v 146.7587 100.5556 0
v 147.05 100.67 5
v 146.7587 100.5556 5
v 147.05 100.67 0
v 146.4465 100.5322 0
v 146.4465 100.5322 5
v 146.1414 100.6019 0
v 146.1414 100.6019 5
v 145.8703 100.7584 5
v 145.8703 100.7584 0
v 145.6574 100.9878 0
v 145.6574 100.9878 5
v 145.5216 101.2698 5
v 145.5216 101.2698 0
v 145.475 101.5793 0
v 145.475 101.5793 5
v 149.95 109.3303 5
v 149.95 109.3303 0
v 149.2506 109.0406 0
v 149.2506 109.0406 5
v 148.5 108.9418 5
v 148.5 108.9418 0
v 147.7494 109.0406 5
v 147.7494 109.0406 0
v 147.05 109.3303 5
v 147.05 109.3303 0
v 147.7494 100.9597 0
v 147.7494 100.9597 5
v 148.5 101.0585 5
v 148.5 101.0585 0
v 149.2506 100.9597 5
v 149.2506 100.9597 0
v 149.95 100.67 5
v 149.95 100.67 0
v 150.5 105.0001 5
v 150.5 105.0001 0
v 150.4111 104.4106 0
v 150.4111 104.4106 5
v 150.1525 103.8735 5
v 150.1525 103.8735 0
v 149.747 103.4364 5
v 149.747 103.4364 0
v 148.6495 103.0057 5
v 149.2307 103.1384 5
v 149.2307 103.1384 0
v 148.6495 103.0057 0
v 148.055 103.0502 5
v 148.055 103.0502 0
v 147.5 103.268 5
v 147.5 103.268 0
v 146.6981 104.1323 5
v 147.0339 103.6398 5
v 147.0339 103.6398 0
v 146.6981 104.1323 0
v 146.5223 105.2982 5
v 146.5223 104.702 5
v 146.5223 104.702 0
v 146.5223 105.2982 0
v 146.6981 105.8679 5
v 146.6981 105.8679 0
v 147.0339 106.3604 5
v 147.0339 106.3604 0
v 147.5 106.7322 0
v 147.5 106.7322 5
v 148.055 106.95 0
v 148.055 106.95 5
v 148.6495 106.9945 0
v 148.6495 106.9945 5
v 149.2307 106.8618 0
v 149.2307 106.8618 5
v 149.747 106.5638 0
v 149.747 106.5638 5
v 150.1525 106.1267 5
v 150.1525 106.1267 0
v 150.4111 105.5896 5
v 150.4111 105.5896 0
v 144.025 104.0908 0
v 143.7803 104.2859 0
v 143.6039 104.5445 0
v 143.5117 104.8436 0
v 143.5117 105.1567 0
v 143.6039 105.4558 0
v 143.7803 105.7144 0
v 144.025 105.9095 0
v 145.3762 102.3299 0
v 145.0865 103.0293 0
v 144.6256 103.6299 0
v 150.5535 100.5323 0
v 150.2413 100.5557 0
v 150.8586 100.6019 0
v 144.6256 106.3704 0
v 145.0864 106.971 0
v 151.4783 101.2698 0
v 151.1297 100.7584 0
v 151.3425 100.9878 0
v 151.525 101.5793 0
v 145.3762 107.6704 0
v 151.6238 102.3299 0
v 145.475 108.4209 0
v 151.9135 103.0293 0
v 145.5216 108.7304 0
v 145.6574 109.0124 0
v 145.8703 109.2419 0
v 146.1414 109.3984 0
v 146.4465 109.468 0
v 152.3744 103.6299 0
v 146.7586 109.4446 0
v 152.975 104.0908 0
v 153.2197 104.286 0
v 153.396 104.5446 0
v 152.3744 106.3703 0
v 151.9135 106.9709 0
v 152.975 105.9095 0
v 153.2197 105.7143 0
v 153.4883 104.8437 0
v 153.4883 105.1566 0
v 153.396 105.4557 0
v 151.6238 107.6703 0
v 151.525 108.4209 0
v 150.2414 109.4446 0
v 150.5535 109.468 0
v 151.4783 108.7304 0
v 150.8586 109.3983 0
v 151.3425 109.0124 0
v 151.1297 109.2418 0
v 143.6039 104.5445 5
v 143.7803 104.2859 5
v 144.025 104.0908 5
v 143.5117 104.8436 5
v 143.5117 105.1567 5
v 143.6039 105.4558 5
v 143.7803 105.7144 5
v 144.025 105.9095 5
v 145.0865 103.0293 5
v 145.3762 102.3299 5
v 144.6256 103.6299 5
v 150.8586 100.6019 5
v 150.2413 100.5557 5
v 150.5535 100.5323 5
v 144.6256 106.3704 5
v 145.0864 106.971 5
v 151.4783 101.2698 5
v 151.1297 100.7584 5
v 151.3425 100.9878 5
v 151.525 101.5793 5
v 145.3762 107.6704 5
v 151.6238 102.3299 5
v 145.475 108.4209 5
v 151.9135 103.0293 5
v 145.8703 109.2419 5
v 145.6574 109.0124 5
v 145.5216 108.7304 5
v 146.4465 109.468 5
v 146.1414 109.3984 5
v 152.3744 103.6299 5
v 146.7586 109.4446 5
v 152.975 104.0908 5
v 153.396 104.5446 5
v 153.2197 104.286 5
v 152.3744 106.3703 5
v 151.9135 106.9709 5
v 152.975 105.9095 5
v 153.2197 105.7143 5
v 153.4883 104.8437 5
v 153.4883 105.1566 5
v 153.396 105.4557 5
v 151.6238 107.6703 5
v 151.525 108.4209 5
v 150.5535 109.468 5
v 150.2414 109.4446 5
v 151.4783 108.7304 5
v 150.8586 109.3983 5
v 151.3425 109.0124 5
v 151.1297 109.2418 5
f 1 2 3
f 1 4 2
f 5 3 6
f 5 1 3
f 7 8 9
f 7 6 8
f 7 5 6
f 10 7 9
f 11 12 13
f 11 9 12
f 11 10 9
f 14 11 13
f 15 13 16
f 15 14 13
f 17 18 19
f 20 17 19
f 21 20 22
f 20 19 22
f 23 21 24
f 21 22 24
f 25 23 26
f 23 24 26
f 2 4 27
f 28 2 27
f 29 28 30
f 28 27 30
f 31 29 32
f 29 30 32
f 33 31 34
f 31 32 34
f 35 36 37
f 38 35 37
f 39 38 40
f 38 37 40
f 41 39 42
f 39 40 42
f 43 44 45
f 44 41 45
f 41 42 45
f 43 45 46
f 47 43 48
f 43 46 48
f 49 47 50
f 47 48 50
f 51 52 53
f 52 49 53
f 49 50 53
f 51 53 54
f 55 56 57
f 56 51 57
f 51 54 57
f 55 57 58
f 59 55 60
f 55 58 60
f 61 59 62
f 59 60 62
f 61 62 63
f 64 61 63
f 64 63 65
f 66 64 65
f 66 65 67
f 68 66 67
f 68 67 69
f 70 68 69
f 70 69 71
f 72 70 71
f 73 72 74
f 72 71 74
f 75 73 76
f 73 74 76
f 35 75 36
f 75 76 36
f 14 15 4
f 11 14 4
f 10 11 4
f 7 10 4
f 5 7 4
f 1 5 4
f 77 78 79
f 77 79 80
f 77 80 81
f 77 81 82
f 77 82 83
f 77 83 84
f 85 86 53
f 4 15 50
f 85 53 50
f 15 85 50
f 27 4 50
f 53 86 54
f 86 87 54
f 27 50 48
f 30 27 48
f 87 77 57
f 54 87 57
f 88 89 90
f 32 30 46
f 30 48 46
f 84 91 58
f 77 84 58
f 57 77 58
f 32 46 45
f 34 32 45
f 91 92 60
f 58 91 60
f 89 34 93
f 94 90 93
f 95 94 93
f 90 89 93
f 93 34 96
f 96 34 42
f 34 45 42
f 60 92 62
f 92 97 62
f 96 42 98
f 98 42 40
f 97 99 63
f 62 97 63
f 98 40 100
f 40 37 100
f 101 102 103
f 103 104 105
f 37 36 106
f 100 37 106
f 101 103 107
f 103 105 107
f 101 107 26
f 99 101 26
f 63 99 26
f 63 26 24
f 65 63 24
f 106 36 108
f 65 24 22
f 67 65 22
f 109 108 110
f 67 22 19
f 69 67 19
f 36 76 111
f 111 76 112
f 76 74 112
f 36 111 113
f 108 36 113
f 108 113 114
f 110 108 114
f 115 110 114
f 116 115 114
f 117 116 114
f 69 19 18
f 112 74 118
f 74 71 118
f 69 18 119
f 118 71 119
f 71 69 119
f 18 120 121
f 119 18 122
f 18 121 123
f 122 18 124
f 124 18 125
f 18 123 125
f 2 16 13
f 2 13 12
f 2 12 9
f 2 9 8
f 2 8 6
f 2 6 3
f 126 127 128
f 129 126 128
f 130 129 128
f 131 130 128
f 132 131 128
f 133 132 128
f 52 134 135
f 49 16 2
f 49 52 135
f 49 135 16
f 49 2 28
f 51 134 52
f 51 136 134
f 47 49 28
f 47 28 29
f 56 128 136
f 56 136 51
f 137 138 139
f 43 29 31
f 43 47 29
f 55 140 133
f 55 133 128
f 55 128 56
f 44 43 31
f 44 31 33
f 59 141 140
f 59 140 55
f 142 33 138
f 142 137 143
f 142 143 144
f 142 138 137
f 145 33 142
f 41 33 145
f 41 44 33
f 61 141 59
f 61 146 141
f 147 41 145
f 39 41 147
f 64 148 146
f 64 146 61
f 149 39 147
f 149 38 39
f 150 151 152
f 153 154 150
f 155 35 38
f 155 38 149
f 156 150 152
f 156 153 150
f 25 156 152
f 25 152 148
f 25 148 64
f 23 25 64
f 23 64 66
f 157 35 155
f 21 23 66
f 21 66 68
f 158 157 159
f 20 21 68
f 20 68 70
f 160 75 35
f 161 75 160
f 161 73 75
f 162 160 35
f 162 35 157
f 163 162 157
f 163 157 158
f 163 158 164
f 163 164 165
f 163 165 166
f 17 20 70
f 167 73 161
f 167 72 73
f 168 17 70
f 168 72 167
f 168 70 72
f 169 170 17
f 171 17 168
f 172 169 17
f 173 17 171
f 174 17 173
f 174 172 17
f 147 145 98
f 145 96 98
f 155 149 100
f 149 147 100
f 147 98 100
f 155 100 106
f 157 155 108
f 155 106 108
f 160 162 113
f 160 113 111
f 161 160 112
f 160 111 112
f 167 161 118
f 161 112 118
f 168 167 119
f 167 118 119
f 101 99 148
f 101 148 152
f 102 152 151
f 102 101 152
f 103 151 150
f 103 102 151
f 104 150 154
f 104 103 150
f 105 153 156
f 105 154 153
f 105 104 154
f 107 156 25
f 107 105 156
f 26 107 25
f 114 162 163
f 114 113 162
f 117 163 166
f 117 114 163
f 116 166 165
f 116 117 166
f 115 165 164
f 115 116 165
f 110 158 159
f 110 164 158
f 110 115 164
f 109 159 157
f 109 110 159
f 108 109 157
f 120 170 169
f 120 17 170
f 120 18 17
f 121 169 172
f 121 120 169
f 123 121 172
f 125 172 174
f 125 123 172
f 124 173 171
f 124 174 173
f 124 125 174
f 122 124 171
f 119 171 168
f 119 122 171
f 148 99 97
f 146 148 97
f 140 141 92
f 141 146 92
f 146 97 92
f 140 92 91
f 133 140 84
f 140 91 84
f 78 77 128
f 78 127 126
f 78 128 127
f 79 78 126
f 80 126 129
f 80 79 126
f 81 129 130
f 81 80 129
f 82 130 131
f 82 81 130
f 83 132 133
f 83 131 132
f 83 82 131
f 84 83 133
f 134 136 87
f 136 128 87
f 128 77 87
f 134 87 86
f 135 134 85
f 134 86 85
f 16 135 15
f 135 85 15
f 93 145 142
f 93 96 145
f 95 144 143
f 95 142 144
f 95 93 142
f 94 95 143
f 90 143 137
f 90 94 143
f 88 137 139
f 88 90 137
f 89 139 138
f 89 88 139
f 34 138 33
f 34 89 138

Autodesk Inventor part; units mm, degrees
ref_plane "YZ Plane" through (0, 0, 0) normal (1, 0, 0) x (0, 1, 0)
ref_plane "XZ Plane" through (0, 0, 0) normal (0, 1, 0) x (-1, 0, 0)
ref_plane "XY Plane" through (0, 0, 0) normal (0, 0, 1) x (1, 0, 0)
sketch "スケッチ1" plane through (0, 0, 0) normal (0, 0, 1) x (1, 0, 0)
  arc A0 (144.025, 105.9095) -> (145.475, 108.4209) centre (142.575, 108.4209) ccw
  arc A1 (145.475, 101.5793) -> (144.025, 104.0908) centre (142.575, 101.5793) ccw
  line L0 (146, 100.67) -> (143.5, 105.0001) construction
  arc A2 (144.025, 105.9095) -> (144.025, 104.0908) centre (144.55, 105.0001) ccw
  line L1 (143.5, 105.0001) -> (146, 109.3303) construction
  circle A3 centre (148.5, 105.0001) radius 5 construction
  arc A4 (149.95, 100.67) -> (147.05, 100.67) centre (148.5, 98.1585) ccw
  line L2 (151, 100.67) -> (146, 100.67) construction
  arc A5 (145.475, 101.5793) -> (147.05, 100.67) centre (146.525, 101.5793) ccw
  arc A6 (149.95, 100.67) -> (151.525, 101.5793) centre (150.475, 101.5793) ccw
  arc A7 (152.975, 104.0908) -> (151.525, 101.5793) centre (154.425, 101.5793) ccw
  line L3 (153.5, 105.0001) -> (151, 100.67) construction
  arc A8 (152.975, 104.0908) -> (152.975, 105.9095) centre (152.45, 105.0001) ccw
  circle A9 centre (148.5, 105.0001) radius 2
  line L4 (151, 109.3303) -> (153.5, 105.0001) construction
  arc A10 (151.525, 108.4209) -> (152.975, 105.9095) centre (154.425, 108.4209) ccw
  arc A11 (151.525, 108.4209) -> (149.95, 109.3303) centre (150.475, 108.4209) ccw
  line L5 (146, 109.3303) -> (151, 109.3303) construction
  arc A12 (147.05, 109.3303) -> (149.95, 109.3303) centre (148.5, 111.8417) ccw
  arc A13 (147.05, 109.3303) -> (145.475, 108.4209) centre (146.525, 108.4209) ccw
  circle A14 centre (148.5, 105.0001) radius 6 construction
  point P0 (0, 0)
  point P1 (146, 100.67)
  point P2 (151, 100.67)
  point P3 (153.5, 105.0001)
  point P4 (145.475, 101.5793)
  point P5 (151.525, 101.5793)
  point P6 (152.975, 104.0908)
  point P7 (152.975, 105.9095)
  point P8 (151.525, 108.4209)
  point P9 (145.475, 108.4209)
  point P10 (144.025, 105.9095)
  point P11 (144.025, 104.0908)
  dimension "d4" = 10
  dimension "d5" = 360
  dimension "d6" = 360
  dimension "d7" = 1.05
  dimension "d8" = 4
  dimension "d9" = 12
extrude "押し出し1" add sketch "スケッチ1" along normal blind 5
properties part number "3ギア接続部" material "アルミニウム 2014-T4"
